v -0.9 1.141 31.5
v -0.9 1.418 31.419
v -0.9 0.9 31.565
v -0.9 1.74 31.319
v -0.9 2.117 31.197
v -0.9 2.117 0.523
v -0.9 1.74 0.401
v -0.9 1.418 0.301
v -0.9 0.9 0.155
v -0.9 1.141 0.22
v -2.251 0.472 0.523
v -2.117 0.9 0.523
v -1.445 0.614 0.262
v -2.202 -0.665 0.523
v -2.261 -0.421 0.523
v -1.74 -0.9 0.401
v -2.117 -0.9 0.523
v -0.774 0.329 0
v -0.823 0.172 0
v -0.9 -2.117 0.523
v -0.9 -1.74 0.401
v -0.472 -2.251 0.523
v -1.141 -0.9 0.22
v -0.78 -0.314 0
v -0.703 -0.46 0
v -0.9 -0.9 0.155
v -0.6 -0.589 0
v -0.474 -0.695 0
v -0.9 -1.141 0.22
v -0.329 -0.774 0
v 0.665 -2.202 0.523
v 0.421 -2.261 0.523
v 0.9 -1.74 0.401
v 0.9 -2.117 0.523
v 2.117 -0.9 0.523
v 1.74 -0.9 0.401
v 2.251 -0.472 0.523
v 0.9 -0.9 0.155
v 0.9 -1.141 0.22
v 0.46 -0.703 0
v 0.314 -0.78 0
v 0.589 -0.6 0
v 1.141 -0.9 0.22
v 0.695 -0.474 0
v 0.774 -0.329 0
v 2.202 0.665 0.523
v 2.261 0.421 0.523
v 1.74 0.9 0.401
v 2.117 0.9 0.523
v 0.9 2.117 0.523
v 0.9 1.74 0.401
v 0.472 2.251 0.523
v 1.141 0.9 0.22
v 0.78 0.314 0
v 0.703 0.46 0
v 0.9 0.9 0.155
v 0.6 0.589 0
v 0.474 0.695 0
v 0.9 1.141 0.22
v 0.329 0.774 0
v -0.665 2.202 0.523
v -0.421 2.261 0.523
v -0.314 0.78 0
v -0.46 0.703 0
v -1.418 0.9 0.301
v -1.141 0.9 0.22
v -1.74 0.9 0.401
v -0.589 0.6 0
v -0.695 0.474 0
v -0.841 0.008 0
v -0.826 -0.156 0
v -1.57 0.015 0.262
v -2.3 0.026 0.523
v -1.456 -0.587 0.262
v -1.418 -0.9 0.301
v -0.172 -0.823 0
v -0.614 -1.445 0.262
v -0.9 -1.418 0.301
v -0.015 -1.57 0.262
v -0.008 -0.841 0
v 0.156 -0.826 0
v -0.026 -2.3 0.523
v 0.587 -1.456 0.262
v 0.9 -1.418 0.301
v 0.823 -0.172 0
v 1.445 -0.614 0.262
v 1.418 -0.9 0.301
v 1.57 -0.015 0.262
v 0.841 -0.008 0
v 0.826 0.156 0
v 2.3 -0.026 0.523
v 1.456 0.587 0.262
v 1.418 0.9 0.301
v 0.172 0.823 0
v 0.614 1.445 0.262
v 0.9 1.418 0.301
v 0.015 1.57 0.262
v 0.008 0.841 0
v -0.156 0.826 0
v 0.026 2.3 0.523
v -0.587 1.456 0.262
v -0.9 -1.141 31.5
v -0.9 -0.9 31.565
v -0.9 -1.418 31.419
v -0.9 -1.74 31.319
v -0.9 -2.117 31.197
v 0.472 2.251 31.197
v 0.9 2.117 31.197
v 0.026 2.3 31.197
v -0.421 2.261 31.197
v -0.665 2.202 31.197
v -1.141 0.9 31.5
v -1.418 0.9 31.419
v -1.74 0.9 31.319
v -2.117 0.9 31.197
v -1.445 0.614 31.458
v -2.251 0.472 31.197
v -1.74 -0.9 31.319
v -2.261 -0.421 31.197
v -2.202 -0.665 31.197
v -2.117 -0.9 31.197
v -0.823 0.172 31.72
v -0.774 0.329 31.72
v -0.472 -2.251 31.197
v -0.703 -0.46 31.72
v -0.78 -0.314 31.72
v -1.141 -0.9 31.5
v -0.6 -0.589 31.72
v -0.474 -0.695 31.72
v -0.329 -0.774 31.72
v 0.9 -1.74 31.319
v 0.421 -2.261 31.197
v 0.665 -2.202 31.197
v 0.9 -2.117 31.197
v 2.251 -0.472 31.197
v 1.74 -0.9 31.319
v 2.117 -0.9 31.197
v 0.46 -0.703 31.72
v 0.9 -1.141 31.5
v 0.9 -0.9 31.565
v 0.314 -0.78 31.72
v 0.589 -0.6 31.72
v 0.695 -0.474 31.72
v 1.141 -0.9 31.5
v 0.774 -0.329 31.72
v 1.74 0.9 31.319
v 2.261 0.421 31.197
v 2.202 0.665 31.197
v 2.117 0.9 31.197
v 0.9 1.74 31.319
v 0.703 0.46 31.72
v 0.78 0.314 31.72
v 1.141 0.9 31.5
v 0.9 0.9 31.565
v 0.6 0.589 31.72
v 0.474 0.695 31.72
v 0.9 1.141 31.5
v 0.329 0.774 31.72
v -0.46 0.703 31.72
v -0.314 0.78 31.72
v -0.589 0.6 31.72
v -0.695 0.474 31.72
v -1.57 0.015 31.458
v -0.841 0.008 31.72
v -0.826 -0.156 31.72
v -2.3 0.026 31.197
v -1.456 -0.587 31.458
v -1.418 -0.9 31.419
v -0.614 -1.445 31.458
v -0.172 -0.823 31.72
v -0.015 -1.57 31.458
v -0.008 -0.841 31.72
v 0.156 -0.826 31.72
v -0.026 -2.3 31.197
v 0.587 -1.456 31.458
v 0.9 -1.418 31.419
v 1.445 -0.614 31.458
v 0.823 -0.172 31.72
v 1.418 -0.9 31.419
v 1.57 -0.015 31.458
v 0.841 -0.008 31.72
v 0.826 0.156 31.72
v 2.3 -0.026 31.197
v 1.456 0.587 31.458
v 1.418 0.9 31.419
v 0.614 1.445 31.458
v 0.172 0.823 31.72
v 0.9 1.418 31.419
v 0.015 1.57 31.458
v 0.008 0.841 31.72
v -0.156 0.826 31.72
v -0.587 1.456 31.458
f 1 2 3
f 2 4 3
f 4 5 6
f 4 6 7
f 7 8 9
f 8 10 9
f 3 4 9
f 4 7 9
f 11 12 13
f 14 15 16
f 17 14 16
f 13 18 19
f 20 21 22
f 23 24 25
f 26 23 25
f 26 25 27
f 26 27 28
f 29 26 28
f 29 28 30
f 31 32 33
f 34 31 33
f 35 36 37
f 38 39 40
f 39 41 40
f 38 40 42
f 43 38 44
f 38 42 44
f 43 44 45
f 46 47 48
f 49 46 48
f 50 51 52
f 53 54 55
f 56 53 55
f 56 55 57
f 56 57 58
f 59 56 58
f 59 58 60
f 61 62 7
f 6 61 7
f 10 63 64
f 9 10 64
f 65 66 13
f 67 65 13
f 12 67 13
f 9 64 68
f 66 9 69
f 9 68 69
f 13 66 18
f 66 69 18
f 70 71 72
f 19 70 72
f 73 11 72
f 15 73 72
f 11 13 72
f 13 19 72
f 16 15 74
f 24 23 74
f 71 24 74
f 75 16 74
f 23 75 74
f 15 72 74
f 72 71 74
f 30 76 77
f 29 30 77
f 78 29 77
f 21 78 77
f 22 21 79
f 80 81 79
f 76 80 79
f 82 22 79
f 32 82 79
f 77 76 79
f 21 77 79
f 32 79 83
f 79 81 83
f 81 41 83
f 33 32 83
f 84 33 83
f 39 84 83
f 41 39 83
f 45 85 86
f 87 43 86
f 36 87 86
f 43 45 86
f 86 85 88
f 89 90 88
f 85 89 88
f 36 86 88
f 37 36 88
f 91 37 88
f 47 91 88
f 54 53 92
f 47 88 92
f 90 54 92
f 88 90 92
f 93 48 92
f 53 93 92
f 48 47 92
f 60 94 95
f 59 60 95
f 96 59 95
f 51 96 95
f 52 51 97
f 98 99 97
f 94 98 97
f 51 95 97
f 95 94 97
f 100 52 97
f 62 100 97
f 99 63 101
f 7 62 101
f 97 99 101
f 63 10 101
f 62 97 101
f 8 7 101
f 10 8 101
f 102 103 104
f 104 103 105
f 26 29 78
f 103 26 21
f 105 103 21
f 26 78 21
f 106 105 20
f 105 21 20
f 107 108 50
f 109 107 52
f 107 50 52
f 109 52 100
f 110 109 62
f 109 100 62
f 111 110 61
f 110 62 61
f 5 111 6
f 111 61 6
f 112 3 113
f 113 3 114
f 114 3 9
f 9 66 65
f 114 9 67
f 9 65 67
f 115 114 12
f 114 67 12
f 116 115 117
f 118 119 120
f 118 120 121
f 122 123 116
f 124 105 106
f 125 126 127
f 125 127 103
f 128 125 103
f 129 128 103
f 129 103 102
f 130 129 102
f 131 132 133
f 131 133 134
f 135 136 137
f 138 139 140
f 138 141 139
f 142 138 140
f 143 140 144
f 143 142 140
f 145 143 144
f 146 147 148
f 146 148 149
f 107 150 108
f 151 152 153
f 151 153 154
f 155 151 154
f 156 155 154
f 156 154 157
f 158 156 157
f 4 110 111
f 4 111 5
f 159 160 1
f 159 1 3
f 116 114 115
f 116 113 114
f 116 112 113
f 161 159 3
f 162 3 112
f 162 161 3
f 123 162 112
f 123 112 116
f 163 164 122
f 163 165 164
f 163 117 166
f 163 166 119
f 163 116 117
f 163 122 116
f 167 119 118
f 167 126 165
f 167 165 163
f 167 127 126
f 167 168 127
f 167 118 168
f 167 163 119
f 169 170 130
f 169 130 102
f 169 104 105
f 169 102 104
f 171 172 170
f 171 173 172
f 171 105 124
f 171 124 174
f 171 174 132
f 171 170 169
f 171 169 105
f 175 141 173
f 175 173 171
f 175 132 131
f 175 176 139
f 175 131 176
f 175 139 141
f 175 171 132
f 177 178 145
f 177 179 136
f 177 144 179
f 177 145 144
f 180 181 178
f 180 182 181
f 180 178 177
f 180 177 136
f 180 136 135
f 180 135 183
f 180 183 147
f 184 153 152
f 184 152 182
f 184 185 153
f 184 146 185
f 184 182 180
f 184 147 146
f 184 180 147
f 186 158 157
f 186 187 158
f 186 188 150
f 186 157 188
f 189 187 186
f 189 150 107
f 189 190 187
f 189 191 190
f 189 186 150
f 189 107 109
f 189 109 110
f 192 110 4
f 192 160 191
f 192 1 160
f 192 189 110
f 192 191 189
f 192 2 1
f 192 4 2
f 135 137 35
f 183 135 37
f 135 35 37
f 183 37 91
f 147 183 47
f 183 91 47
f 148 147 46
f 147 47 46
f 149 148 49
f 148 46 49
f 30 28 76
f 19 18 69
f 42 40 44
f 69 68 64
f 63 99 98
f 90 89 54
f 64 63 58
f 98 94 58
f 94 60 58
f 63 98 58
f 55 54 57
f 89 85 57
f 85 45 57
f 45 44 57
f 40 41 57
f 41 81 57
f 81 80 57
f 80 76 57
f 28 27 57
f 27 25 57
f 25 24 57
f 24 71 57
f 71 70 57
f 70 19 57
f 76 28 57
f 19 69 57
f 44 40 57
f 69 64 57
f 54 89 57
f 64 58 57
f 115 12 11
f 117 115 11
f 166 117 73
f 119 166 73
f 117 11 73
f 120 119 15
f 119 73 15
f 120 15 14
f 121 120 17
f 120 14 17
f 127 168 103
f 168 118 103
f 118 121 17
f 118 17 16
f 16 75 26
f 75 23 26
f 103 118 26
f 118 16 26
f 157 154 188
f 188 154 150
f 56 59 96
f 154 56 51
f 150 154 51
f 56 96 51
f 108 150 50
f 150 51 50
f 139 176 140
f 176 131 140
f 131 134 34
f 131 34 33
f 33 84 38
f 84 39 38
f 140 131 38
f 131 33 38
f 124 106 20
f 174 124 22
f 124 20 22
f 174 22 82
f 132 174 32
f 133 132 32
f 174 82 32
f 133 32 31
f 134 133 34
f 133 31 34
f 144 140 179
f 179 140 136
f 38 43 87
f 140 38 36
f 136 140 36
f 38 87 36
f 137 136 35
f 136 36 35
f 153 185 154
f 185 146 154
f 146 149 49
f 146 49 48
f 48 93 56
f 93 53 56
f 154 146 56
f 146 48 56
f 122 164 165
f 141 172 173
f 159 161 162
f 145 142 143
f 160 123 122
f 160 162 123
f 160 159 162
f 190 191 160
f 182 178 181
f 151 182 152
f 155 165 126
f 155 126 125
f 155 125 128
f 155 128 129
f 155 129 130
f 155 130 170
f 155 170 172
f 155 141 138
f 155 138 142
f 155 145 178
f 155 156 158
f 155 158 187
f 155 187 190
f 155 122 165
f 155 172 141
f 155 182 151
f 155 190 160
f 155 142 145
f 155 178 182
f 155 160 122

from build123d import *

# Parameters (mm, degrees)
BOSS_EXTRUDE1_DEPTH = 31.72


with BuildPart() as part:
    # Sketch1 → Boss-Extrude1 (new body)
    with BuildSketch(Plane.XY):
        with BuildLine():
            Line((-0.9, 2.116601049), (-0.9, 0.9))
            Line((-0.9, 0.9), (-2.116601049, 0.9))
            ThreePointArc((-2.116601049, 0.9), (-2.3, 0), (-2.116601049, -0.9))
            Line((-2.116601049, -0.9), (-0.9, -0.9))
            Line((-0.9, -0.9), (-0.9, -2.116601049))
            ThreePointArc((-0.9, -2.116601049), (0, -2.3), (0.9, -2.116601049))
            Line((0.9, -2.116601049), (0.9, -0.9))
            Line((0.9, -0.9), (2.116601049, -0.9))
            ThreePointArc((2.116601049, -0.9), (2.3, 0), (2.116601049, 0.9))
            Line((2.116601049, 0.9), (0.9, 0.9))
            Line((0.9, 0.9), (0.9, 2.116601049))
            ThreePointArc((0.9, 2.116601049), (0, 2.3), (-0.9, 2.116601049))
        make_face()
    extrude(amount=BOSS_EXTRUDE1_DEPTH)

    # Sketch2 → Cut-Revolve3 (revolve, cut)
    with BuildSketch(Plane(origin=(0, 0, 0), x_dir=(1, 0, 0), z_dir=(0, 1, 0)), mode=Mode.PRIVATE) as cut_revolve3_sk:
        Polygon((0.228583367, 0.219399408), (2.871914227, 0.219399408), (2.871914227, -0.728161621), align=None)
        Polygon((2.871914227, -30.991838379), (0.228583367, -31.939399408), (2.871914227, -31.939399408), align=None)
    revolve(cut_revolve3_sk.sketch.rotate(Axis((0, 0, -10.126702137), (0, 0, 1)), 156.964321077), axis=Axis((0, 0, -10.126702137), (0, 0, 1)), mode=Mode.SUBTRACT)


solid = part.part
